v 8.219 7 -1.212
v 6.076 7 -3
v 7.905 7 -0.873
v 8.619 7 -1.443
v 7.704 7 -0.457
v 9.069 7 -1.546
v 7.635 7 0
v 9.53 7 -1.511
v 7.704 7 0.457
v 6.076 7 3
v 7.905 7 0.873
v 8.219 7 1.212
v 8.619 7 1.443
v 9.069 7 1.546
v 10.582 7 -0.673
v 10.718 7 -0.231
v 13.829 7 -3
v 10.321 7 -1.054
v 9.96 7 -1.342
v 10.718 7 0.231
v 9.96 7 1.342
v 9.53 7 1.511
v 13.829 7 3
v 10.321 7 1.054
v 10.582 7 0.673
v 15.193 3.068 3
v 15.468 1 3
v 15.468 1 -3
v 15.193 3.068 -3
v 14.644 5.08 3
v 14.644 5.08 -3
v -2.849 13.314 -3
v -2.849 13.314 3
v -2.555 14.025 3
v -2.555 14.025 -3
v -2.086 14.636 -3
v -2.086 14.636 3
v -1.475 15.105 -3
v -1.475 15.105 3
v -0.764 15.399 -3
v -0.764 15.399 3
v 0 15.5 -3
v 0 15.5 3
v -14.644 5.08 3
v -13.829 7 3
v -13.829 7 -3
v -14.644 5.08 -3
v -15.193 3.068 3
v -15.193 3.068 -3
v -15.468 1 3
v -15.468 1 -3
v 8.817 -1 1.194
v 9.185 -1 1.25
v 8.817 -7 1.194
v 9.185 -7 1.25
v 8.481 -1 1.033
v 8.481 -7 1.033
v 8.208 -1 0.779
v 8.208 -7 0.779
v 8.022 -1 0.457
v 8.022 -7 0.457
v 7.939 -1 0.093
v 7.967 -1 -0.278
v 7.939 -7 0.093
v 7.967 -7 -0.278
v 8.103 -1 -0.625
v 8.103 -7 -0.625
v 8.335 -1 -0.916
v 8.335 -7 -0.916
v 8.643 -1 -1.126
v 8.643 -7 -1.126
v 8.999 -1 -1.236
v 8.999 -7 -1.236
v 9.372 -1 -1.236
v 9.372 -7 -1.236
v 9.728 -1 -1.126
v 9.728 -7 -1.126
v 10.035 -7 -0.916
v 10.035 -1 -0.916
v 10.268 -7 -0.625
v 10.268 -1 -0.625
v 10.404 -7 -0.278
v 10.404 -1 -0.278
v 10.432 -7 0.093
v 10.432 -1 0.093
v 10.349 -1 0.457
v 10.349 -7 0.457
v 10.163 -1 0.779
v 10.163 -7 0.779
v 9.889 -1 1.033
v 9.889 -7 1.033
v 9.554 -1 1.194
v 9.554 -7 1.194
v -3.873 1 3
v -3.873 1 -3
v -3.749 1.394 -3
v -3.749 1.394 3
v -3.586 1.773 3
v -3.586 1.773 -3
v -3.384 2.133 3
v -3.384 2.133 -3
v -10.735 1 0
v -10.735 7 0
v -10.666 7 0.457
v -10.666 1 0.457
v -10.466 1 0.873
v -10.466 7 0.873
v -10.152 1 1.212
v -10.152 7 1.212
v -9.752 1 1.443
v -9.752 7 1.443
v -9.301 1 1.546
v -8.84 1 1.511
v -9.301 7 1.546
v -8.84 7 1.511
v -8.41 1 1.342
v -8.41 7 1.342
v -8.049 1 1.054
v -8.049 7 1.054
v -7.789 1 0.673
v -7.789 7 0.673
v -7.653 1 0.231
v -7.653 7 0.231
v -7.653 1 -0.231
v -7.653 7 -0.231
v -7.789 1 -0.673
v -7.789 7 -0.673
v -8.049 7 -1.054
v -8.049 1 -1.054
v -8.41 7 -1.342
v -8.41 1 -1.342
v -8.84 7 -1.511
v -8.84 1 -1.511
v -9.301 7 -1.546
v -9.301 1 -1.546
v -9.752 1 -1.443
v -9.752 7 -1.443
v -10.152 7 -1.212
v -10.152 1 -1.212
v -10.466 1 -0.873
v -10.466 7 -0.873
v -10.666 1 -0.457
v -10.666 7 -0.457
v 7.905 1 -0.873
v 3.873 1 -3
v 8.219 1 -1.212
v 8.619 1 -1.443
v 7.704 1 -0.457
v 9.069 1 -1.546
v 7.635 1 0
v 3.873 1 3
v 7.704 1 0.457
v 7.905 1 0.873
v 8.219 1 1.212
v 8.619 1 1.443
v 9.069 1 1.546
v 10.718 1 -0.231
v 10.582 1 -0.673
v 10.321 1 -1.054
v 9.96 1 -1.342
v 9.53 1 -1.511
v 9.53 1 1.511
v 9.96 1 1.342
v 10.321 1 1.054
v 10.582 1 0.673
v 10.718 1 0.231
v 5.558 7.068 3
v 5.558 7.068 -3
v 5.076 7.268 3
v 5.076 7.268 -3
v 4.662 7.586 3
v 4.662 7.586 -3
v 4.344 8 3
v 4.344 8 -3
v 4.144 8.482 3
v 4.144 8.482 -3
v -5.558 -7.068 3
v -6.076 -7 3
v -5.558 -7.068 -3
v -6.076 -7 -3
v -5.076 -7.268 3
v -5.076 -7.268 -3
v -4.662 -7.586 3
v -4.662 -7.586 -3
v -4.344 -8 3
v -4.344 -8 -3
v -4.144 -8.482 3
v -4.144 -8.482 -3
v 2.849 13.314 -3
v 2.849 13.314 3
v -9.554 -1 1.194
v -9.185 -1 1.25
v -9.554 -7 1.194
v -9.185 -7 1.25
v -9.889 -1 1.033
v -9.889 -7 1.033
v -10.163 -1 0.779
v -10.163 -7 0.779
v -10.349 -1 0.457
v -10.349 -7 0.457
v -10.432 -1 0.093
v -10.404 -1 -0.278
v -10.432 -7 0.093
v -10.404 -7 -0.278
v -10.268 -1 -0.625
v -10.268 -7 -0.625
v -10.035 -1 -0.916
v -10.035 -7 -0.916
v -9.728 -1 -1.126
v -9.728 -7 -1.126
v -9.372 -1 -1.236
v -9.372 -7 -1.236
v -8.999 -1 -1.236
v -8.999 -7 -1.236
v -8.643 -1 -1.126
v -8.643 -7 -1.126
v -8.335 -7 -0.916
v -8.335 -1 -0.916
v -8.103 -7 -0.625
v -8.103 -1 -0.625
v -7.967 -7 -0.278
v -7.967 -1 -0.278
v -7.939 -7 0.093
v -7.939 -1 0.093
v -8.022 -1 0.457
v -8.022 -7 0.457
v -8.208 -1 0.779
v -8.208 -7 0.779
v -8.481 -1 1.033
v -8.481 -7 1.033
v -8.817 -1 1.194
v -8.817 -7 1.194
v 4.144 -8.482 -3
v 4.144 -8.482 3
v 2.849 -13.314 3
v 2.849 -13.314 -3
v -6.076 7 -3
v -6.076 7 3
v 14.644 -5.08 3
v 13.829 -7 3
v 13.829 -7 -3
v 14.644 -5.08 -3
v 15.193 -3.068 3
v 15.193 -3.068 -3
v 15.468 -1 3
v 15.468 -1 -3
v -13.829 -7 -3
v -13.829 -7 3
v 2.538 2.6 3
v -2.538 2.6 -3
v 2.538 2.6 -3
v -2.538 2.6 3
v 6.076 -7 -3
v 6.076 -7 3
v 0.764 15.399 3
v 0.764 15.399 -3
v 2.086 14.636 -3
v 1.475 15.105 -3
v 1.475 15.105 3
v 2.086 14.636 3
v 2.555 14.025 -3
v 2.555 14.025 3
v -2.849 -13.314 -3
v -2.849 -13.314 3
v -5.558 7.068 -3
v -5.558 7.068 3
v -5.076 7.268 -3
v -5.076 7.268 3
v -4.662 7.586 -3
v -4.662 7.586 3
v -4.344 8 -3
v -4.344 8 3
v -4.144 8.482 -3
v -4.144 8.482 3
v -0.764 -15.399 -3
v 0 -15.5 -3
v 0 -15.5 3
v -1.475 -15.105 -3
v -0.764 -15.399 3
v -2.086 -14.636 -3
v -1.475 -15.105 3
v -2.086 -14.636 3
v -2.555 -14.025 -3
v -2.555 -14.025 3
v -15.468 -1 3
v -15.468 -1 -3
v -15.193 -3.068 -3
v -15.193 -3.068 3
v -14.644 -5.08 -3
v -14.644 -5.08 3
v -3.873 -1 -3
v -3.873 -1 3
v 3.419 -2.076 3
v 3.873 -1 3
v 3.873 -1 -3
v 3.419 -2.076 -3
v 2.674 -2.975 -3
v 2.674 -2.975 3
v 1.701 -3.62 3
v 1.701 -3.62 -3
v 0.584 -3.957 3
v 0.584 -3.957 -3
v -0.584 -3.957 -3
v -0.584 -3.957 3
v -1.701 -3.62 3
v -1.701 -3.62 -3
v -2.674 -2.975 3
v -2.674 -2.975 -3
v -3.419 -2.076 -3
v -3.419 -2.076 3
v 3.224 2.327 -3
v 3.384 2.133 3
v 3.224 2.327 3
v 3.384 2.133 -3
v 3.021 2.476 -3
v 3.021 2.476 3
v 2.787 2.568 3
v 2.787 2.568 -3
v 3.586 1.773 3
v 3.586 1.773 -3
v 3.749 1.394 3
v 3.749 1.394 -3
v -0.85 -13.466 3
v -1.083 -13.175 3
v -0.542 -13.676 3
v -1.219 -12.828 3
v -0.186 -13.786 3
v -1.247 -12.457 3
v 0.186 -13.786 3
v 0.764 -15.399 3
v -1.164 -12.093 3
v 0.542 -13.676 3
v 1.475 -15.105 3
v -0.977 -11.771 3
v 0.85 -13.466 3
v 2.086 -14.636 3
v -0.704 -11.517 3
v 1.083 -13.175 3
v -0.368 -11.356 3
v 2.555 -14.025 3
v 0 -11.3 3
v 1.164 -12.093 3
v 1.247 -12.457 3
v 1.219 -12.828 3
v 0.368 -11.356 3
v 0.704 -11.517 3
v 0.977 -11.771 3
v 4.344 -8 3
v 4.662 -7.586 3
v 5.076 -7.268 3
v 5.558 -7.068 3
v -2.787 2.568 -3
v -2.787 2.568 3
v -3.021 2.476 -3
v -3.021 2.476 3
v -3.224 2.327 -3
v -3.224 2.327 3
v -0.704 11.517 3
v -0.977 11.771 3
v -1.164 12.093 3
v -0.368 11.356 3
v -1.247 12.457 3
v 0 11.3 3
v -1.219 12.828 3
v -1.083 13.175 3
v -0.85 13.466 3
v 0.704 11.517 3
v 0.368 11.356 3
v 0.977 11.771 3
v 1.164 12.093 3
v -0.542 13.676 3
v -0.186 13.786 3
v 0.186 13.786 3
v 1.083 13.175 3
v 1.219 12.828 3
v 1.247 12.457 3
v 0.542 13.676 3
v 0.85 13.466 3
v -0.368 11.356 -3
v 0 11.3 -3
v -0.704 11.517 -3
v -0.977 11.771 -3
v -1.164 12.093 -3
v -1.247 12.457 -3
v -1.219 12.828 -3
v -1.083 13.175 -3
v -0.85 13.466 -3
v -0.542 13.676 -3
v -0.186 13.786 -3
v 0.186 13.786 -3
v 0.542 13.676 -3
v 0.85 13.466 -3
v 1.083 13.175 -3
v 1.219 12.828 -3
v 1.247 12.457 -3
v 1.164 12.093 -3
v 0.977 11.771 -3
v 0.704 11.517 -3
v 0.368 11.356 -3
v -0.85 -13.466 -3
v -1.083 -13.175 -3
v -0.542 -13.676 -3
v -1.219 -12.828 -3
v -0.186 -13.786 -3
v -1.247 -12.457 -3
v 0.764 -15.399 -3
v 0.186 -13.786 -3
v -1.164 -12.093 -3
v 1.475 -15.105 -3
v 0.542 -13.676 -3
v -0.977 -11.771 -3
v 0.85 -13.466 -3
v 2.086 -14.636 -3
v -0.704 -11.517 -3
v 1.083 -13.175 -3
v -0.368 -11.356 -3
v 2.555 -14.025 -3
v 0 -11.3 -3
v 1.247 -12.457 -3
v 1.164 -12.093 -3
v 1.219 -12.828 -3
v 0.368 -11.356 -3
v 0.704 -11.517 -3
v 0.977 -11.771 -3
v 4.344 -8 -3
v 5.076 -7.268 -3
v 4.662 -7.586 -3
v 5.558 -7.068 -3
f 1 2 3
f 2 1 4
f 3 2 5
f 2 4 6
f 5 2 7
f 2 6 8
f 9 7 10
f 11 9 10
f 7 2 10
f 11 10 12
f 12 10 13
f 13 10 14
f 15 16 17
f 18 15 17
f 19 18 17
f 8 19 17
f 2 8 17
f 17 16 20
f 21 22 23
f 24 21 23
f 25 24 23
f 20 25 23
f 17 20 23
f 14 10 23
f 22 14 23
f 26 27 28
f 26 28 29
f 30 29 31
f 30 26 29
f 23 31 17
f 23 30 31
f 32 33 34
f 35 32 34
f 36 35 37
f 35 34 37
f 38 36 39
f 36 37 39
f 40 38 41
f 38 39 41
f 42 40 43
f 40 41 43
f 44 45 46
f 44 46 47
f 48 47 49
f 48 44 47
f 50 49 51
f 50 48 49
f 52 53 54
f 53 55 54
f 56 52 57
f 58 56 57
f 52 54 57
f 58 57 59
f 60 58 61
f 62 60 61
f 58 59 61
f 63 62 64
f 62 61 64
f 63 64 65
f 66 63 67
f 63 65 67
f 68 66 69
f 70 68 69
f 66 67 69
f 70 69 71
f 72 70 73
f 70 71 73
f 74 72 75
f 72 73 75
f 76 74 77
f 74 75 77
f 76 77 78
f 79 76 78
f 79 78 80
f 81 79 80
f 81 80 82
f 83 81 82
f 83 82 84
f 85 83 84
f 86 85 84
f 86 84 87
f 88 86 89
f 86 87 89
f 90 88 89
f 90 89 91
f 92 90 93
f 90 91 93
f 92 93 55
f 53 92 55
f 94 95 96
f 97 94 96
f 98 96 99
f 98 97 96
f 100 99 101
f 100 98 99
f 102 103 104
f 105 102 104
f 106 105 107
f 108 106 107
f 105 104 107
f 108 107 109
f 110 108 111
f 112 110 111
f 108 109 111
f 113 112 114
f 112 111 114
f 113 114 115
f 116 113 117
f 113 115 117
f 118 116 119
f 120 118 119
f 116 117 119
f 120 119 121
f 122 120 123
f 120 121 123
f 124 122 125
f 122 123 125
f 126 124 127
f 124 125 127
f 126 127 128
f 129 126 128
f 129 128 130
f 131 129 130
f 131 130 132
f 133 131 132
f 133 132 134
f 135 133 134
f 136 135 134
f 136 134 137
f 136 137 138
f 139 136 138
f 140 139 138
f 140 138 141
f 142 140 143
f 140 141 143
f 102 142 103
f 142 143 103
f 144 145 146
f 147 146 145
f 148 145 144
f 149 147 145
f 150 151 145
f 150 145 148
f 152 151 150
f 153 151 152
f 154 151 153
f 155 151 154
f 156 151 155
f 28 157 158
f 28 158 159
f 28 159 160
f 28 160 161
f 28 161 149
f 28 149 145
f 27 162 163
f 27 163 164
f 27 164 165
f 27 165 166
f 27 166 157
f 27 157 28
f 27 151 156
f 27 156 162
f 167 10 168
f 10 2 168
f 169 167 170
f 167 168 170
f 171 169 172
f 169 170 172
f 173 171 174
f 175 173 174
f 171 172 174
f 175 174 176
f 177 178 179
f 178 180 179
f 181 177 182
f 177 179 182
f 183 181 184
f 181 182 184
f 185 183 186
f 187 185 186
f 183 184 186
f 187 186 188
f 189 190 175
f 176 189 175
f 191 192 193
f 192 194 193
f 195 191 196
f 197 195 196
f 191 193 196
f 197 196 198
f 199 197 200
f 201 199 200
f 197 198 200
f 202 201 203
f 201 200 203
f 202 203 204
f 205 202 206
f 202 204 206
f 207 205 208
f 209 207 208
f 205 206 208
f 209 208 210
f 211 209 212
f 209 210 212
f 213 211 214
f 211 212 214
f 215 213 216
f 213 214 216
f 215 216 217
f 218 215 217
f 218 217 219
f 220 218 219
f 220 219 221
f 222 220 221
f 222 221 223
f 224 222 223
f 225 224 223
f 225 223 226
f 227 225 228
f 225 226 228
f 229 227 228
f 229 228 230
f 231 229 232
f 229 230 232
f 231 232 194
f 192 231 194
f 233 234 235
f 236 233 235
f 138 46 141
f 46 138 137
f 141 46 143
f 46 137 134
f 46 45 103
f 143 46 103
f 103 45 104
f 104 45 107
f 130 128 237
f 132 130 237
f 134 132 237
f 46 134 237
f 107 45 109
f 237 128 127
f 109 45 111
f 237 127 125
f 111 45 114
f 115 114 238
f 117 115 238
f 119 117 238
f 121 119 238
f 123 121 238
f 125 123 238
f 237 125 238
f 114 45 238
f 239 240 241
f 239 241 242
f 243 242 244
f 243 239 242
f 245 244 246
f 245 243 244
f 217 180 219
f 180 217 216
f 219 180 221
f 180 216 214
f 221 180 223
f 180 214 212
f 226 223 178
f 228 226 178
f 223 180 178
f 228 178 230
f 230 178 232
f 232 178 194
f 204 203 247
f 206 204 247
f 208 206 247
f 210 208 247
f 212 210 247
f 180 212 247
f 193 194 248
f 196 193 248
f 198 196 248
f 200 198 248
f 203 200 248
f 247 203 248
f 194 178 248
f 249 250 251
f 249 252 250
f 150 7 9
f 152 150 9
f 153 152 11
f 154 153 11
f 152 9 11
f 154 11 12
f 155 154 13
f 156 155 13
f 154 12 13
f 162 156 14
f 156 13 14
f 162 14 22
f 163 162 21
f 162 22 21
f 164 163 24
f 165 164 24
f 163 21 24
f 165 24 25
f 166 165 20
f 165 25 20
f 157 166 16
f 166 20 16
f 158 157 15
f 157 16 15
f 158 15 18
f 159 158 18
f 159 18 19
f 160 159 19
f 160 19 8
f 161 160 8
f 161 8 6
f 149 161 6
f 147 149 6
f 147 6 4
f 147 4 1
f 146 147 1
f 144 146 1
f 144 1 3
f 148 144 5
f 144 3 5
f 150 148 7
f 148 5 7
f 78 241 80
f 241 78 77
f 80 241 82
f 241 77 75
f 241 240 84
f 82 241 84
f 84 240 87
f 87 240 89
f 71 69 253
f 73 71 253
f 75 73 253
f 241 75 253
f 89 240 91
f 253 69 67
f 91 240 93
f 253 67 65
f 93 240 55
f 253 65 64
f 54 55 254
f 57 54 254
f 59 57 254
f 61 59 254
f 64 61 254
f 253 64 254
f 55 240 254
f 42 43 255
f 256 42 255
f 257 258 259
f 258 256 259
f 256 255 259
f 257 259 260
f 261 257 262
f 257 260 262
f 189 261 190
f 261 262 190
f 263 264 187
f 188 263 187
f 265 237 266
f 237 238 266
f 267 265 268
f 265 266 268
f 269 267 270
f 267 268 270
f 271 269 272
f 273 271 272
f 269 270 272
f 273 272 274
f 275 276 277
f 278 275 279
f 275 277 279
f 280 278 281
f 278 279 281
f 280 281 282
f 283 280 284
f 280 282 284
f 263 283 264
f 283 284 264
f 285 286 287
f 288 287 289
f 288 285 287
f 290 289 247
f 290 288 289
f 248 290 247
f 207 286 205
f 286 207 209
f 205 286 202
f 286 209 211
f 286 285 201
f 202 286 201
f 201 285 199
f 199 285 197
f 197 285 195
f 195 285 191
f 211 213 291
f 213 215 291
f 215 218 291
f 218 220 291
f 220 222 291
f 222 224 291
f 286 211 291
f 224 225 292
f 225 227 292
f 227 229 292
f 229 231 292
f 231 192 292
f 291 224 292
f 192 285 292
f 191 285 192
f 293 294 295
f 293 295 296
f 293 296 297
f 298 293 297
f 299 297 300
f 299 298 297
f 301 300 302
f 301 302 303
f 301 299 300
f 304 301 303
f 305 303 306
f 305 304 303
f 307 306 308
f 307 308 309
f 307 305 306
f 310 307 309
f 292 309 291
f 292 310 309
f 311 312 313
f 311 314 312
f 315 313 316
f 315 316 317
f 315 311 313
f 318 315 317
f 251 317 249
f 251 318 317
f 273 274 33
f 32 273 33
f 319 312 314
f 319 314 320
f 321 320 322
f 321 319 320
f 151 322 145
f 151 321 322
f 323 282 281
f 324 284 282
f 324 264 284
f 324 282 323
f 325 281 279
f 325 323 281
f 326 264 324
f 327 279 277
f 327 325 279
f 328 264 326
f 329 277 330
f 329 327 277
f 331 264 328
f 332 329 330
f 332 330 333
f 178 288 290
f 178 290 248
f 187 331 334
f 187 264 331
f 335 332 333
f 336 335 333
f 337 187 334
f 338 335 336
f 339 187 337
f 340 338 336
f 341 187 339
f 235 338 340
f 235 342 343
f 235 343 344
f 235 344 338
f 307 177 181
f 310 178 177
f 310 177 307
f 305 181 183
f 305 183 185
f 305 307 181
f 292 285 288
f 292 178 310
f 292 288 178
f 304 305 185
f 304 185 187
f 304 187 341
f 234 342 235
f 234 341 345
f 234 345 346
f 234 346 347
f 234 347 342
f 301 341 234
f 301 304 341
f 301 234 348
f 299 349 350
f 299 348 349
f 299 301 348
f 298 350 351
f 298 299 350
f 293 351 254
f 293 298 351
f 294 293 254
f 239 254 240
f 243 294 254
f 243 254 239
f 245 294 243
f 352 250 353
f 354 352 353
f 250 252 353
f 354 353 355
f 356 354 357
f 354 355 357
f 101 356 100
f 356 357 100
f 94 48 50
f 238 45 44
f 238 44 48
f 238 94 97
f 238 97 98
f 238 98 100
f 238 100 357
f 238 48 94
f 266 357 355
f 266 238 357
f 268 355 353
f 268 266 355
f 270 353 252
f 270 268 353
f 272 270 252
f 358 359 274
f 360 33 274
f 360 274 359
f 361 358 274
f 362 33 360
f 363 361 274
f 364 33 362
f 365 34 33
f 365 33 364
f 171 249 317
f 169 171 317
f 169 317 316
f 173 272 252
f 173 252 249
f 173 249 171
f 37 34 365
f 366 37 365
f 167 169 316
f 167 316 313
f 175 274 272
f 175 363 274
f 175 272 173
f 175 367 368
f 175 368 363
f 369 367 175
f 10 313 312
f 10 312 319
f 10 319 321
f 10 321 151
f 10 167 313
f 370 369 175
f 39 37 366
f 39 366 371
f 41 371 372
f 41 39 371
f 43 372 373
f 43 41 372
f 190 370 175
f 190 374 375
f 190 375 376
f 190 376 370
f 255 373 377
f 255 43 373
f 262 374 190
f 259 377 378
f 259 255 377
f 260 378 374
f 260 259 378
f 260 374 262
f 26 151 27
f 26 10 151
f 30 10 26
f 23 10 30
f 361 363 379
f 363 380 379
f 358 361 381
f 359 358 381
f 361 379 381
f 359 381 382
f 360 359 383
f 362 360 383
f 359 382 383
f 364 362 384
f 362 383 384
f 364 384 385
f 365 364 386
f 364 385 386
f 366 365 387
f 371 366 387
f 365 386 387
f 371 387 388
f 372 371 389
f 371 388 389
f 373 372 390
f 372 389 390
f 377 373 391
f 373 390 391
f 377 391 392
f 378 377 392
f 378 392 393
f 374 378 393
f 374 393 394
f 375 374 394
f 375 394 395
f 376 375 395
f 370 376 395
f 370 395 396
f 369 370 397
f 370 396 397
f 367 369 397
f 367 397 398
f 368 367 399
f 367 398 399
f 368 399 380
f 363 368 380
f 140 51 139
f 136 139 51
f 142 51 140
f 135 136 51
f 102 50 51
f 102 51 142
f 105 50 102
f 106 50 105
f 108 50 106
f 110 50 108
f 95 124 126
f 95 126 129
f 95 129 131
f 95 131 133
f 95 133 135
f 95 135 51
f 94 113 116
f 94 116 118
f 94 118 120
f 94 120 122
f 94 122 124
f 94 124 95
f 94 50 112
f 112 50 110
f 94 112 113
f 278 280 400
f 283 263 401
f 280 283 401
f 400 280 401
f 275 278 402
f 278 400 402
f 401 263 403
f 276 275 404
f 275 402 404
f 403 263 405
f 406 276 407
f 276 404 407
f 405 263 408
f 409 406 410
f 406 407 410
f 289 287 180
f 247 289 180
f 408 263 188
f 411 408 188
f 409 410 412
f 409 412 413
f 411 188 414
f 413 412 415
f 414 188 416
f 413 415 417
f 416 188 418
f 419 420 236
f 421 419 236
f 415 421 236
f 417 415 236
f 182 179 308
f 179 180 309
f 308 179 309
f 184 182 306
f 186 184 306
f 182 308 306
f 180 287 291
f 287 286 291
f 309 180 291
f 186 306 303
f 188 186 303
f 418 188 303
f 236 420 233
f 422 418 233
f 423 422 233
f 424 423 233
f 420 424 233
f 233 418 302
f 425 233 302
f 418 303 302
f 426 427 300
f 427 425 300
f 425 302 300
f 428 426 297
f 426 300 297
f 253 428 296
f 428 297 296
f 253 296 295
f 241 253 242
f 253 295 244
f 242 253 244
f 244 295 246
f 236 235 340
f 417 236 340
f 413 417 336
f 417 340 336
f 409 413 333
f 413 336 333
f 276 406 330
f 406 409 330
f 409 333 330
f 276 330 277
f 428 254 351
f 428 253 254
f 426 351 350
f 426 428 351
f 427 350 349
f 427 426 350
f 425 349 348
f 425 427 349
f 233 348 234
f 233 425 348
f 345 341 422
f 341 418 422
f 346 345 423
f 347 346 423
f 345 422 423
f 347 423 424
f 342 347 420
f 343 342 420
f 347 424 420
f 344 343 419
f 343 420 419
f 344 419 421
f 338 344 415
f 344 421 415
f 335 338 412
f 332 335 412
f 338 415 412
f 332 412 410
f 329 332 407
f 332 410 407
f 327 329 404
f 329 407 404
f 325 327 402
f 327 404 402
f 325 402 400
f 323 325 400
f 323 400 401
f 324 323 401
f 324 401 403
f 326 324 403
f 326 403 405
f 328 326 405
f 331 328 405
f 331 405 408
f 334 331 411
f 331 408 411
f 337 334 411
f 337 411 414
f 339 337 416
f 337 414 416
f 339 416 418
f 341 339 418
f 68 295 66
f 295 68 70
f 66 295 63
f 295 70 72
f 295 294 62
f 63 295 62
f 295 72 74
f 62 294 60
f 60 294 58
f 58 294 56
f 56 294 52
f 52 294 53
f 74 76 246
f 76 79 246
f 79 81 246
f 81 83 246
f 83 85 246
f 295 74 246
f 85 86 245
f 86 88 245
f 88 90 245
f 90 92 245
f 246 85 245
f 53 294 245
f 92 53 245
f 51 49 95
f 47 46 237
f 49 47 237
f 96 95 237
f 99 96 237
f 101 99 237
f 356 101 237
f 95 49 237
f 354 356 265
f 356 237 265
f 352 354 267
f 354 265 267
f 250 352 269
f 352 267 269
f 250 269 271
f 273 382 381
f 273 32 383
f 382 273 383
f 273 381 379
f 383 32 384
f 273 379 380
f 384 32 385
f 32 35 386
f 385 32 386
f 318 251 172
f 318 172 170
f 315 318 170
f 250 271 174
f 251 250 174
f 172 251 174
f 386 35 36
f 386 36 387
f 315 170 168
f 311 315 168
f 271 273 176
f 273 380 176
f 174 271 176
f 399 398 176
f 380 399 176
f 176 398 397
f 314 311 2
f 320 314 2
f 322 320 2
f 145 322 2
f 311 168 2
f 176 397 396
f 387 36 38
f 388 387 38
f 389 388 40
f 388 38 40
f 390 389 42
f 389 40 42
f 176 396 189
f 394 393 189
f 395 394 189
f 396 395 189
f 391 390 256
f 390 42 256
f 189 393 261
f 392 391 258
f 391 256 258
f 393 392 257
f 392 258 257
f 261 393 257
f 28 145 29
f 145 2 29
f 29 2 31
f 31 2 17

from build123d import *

# Parameters (mm, degrees)
SKETCH_1_R                  = 15.5
EXTRUDE_1_DEPTH             = 3
SKETCH_2_W                  = 35
SKETCH_2_H                  = 2
CUT_EXTRUDE_1_DEPTH         = 24
SKETCH_5_W                  = 1.25
SKETCH_5_H                  = 6
PATTERN_CIRCULAR_1_COUNT    = 2
CUT_EXTRUDE_2_DEPTH         = 54
SKETCH_8_R                  = 1.55
CUT_EXTRUDE_3_DEPTH         = 6
SKETCH_10_W                 = 1.25
SKETCH_10_H                 = 14.5
HOLE_WIZARD_M3_2_AT_2_COUNT = 2
HOLE_WIZARD_M3_2_AT_2_PITCH = 18.370499436
FILLET_2_R                  = 1
CUT_EXTRUDE_4_DEPTH         = 10
FILLET_1_R                  = 2
FILLET_3_R                  = 2


with BuildPart() as part:
    # 草图1 → 凸台-拉伸1 (new, symmetric)
    with BuildSketch(Plane.XY):
        Circle(SKETCH_1_R)
        with BuildLine():
            Line((-3.039736831, 2.6), (3.039736831, 2.6))
            ThreePointArc((3.039736831, 2.6), (0, -4), (-3.039736831, 2.6))
        make_face(mode=Mode.SUBTRACT)
    extrude(amount=EXTRUDE_1_DEPTH, both=True)

    # 草图2 → 切除-拉伸1 (cut, symmetric)
    with BuildSketch(Plane.XY.offset(3)):
        Rectangle(SKETCH_2_W, SKETCH_2_H)
    extrude(amount=CUT_EXTRUDE_1_DEPTH, both=True, mode=Mode.SUBTRACT)


with BuildPart() as cut_extrude_1_piece_1:
    # of the separate pieces the step leaves, piece 1, a body of its own (cut_extrude_1_pieces)
    add(part.part.solids().sort_by_distance((15.467708298, 1, -3))[0])

    # 草图5 → M3 螺纹孔1 (revolve, cut)
    with BuildSketch(Plane(origin=(0, 12.55, 3), x_dir=(0, -1, 0), z_dir=(1, 0, 0))):
        with Locations((0.625, 3)):
            Rectangle(SKETCH_5_W, SKETCH_5_H)
    hole_wizard_m3_1 = revolve(axis=Axis((0, 12.55, 9.35), (0, 0, -1)), mode=Mode.SUBTRACT)

    # 草图7 → 切除-拉伸2 (cut, symmetric)
    with BuildSketch(Plane.XY.offset(3)):
        with BuildLine():
            ThreePointArc((1.3e-08, 15.5), (-8.116341535, 13.20511265), (-13.829316686, 7))
            Line((-13.829316686, 7), (-4.54118275, 7))
            Line((-4.54118275, 7), (-2.849481188, 13.313516183))
            ThreePointArc((-2.849481188, 13.313516183), (-1.79584621, 14.890392358), (1.3e-08, 15.5))
        make_face()
        with BuildLine():
            ThreePointArc((13.829316686, 7), (8.116341546, 13.205112643), (1.3e-08, 15.5))
            ThreePointArc((1.3e-08, 15.5), (1.795846221, 14.89039235), (2.849481188, 13.313516183))
            Line((2.849481188, 13.313516183), (4.54118275, 7))
            Line((4.54118275, 7), (13.829316686, 7))
        make_face()
    extrude(amount=CUT_EXTRUDE_2_DEPTH, both=True, mode=Mode.SUBTRACT)

    # 草图8 → 切除-拉伸3 (cut)
    with BuildSketch(Plane(origin=(0, 7, 0), x_dir=(1, 0, 0), z_dir=(0, 1, 0))):
        with Locations(Location((-9.185249718, 0, 0), (0, 0, 180))):
            Circle(SKETCH_8_R)
        with Locations(Location((9.185249718, 0, 0), (0, 0, 180))):
            Circle(SKETCH_8_R)
    extrude(amount=-CUT_EXTRUDE_3_DEPTH, mode=Mode.SUBTRACT)

    # 圆角2
    fillet_2_edges = [cut_extrude_1_piece_1.edges().sort_by_distance(p)[0] for p in [
        (3.039736831, 2.6, 0),
        (-3.039736831, 2.6, 0),
    ]]
    fillet(fillet_2_edges, radius=FILLET_2_R)

    # 圆角1
    fillet_1_edges = [cut_extrude_1_piece_1.edges().sort_by_distance(p)[0] for p in [
        (-4.54118275, 7, 0),
        (4.54118275, 7, 0),
    ]]
    fillet(fillet_1_edges, radius=FILLET_1_R)


with BuildPart() as cut_extrude_1_piece_2:
    # of the separate pieces the step leaves, piece 2, a body of its own (cut_extrude_1_pieces)
    add(part.part.solids().sort_by_distance((-15.467708298, -1, -3))[0])

    # 阵列(圆周)1: M3 螺纹孔1 ×2 about axis
    pattern_circular_1_axis = Axis((0, 0, 0), (0, 0, 1))
    for i in range(1, PATTERN_CIRCULAR_1_COUNT):
        add(hole_wizard_m3_1.rotate(pattern_circular_1_axis, i * 360 / PATTERN_CIRCULAR_1_COUNT), mode=Mode.SUBTRACT)

    # 草图10 → M3 螺纹孔2 (revolve, cut)
    with BuildSketch(Plane(origin=(-9.185249718, -1, 0), x_dir=(0, 0, 1), z_dir=(1, 0, 0))):
        with Locations((0.625, 7.25)):
            Rectangle(SKETCH_10_W, SKETCH_10_H)
    hole_wizard_m3_2 = revolve(axis=Axis((-9.185249718, 5.35, 0), (0, -1, 0)), mode=Mode.SUBTRACT)

    # M3 螺纹孔2 at 2: M3 螺纹孔2 ×2
    with Locations(*[(i * HOLE_WIZARD_M3_2_AT_2_PITCH, 0, 0) for i in range(1, HOLE_WIZARD_M3_2_AT_2_COUNT)]):
        add(hole_wizard_m3_2, mode=Mode.SUBTRACT)

    # 草图12 → 切除-拉伸4 (cut)
    with BuildSketch(Plane.XY.offset(3)):
        with BuildLine():
            ThreePointArc((-13.829316686, -7), (-8.116341539, -13.205112647), (3e-09, -15.5))
            ThreePointArc((3e-09, -15.5), (-1.795846214, -14.890392355), (-2.849481188, -13.313516183))
            Line((-2.849481188, -13.313516183), (-4.54118275, -7))
            Line((-4.54118275, -7), (-13.829316686, -7))
        make_face()
        with BuildLine():
            ThreePointArc((3e-09, -15.5), (8.116341542, -13.205112645), (13.829316686, -7))
            Line((13.829316686, -7), (4.54118275, -7))
            Line((4.54118275, -7), (2.849481188, -13.313516183))
            ThreePointArc((2.849481188, -13.313516183), (1.795846217, -14.890392353), (3e-09, -15.5))
        make_face()
    extrude(amount=-CUT_EXTRUDE_4_DEPTH, mode=Mode.SUBTRACT)

    # 圆角3
    fillet_3_edges = [cut_extrude_1_piece_2.edges().sort_by_distance(p)[0] for p in [
        (-4.54118275, -7, 0),
        (4.54118275, -7, 0),
    ]]
    fillet(fillet_3_edges, radius=FILLET_3_R)


solid = Compound([cut_extrude_1_piece_1.part, cut_extrude_1_piece_2.part])
